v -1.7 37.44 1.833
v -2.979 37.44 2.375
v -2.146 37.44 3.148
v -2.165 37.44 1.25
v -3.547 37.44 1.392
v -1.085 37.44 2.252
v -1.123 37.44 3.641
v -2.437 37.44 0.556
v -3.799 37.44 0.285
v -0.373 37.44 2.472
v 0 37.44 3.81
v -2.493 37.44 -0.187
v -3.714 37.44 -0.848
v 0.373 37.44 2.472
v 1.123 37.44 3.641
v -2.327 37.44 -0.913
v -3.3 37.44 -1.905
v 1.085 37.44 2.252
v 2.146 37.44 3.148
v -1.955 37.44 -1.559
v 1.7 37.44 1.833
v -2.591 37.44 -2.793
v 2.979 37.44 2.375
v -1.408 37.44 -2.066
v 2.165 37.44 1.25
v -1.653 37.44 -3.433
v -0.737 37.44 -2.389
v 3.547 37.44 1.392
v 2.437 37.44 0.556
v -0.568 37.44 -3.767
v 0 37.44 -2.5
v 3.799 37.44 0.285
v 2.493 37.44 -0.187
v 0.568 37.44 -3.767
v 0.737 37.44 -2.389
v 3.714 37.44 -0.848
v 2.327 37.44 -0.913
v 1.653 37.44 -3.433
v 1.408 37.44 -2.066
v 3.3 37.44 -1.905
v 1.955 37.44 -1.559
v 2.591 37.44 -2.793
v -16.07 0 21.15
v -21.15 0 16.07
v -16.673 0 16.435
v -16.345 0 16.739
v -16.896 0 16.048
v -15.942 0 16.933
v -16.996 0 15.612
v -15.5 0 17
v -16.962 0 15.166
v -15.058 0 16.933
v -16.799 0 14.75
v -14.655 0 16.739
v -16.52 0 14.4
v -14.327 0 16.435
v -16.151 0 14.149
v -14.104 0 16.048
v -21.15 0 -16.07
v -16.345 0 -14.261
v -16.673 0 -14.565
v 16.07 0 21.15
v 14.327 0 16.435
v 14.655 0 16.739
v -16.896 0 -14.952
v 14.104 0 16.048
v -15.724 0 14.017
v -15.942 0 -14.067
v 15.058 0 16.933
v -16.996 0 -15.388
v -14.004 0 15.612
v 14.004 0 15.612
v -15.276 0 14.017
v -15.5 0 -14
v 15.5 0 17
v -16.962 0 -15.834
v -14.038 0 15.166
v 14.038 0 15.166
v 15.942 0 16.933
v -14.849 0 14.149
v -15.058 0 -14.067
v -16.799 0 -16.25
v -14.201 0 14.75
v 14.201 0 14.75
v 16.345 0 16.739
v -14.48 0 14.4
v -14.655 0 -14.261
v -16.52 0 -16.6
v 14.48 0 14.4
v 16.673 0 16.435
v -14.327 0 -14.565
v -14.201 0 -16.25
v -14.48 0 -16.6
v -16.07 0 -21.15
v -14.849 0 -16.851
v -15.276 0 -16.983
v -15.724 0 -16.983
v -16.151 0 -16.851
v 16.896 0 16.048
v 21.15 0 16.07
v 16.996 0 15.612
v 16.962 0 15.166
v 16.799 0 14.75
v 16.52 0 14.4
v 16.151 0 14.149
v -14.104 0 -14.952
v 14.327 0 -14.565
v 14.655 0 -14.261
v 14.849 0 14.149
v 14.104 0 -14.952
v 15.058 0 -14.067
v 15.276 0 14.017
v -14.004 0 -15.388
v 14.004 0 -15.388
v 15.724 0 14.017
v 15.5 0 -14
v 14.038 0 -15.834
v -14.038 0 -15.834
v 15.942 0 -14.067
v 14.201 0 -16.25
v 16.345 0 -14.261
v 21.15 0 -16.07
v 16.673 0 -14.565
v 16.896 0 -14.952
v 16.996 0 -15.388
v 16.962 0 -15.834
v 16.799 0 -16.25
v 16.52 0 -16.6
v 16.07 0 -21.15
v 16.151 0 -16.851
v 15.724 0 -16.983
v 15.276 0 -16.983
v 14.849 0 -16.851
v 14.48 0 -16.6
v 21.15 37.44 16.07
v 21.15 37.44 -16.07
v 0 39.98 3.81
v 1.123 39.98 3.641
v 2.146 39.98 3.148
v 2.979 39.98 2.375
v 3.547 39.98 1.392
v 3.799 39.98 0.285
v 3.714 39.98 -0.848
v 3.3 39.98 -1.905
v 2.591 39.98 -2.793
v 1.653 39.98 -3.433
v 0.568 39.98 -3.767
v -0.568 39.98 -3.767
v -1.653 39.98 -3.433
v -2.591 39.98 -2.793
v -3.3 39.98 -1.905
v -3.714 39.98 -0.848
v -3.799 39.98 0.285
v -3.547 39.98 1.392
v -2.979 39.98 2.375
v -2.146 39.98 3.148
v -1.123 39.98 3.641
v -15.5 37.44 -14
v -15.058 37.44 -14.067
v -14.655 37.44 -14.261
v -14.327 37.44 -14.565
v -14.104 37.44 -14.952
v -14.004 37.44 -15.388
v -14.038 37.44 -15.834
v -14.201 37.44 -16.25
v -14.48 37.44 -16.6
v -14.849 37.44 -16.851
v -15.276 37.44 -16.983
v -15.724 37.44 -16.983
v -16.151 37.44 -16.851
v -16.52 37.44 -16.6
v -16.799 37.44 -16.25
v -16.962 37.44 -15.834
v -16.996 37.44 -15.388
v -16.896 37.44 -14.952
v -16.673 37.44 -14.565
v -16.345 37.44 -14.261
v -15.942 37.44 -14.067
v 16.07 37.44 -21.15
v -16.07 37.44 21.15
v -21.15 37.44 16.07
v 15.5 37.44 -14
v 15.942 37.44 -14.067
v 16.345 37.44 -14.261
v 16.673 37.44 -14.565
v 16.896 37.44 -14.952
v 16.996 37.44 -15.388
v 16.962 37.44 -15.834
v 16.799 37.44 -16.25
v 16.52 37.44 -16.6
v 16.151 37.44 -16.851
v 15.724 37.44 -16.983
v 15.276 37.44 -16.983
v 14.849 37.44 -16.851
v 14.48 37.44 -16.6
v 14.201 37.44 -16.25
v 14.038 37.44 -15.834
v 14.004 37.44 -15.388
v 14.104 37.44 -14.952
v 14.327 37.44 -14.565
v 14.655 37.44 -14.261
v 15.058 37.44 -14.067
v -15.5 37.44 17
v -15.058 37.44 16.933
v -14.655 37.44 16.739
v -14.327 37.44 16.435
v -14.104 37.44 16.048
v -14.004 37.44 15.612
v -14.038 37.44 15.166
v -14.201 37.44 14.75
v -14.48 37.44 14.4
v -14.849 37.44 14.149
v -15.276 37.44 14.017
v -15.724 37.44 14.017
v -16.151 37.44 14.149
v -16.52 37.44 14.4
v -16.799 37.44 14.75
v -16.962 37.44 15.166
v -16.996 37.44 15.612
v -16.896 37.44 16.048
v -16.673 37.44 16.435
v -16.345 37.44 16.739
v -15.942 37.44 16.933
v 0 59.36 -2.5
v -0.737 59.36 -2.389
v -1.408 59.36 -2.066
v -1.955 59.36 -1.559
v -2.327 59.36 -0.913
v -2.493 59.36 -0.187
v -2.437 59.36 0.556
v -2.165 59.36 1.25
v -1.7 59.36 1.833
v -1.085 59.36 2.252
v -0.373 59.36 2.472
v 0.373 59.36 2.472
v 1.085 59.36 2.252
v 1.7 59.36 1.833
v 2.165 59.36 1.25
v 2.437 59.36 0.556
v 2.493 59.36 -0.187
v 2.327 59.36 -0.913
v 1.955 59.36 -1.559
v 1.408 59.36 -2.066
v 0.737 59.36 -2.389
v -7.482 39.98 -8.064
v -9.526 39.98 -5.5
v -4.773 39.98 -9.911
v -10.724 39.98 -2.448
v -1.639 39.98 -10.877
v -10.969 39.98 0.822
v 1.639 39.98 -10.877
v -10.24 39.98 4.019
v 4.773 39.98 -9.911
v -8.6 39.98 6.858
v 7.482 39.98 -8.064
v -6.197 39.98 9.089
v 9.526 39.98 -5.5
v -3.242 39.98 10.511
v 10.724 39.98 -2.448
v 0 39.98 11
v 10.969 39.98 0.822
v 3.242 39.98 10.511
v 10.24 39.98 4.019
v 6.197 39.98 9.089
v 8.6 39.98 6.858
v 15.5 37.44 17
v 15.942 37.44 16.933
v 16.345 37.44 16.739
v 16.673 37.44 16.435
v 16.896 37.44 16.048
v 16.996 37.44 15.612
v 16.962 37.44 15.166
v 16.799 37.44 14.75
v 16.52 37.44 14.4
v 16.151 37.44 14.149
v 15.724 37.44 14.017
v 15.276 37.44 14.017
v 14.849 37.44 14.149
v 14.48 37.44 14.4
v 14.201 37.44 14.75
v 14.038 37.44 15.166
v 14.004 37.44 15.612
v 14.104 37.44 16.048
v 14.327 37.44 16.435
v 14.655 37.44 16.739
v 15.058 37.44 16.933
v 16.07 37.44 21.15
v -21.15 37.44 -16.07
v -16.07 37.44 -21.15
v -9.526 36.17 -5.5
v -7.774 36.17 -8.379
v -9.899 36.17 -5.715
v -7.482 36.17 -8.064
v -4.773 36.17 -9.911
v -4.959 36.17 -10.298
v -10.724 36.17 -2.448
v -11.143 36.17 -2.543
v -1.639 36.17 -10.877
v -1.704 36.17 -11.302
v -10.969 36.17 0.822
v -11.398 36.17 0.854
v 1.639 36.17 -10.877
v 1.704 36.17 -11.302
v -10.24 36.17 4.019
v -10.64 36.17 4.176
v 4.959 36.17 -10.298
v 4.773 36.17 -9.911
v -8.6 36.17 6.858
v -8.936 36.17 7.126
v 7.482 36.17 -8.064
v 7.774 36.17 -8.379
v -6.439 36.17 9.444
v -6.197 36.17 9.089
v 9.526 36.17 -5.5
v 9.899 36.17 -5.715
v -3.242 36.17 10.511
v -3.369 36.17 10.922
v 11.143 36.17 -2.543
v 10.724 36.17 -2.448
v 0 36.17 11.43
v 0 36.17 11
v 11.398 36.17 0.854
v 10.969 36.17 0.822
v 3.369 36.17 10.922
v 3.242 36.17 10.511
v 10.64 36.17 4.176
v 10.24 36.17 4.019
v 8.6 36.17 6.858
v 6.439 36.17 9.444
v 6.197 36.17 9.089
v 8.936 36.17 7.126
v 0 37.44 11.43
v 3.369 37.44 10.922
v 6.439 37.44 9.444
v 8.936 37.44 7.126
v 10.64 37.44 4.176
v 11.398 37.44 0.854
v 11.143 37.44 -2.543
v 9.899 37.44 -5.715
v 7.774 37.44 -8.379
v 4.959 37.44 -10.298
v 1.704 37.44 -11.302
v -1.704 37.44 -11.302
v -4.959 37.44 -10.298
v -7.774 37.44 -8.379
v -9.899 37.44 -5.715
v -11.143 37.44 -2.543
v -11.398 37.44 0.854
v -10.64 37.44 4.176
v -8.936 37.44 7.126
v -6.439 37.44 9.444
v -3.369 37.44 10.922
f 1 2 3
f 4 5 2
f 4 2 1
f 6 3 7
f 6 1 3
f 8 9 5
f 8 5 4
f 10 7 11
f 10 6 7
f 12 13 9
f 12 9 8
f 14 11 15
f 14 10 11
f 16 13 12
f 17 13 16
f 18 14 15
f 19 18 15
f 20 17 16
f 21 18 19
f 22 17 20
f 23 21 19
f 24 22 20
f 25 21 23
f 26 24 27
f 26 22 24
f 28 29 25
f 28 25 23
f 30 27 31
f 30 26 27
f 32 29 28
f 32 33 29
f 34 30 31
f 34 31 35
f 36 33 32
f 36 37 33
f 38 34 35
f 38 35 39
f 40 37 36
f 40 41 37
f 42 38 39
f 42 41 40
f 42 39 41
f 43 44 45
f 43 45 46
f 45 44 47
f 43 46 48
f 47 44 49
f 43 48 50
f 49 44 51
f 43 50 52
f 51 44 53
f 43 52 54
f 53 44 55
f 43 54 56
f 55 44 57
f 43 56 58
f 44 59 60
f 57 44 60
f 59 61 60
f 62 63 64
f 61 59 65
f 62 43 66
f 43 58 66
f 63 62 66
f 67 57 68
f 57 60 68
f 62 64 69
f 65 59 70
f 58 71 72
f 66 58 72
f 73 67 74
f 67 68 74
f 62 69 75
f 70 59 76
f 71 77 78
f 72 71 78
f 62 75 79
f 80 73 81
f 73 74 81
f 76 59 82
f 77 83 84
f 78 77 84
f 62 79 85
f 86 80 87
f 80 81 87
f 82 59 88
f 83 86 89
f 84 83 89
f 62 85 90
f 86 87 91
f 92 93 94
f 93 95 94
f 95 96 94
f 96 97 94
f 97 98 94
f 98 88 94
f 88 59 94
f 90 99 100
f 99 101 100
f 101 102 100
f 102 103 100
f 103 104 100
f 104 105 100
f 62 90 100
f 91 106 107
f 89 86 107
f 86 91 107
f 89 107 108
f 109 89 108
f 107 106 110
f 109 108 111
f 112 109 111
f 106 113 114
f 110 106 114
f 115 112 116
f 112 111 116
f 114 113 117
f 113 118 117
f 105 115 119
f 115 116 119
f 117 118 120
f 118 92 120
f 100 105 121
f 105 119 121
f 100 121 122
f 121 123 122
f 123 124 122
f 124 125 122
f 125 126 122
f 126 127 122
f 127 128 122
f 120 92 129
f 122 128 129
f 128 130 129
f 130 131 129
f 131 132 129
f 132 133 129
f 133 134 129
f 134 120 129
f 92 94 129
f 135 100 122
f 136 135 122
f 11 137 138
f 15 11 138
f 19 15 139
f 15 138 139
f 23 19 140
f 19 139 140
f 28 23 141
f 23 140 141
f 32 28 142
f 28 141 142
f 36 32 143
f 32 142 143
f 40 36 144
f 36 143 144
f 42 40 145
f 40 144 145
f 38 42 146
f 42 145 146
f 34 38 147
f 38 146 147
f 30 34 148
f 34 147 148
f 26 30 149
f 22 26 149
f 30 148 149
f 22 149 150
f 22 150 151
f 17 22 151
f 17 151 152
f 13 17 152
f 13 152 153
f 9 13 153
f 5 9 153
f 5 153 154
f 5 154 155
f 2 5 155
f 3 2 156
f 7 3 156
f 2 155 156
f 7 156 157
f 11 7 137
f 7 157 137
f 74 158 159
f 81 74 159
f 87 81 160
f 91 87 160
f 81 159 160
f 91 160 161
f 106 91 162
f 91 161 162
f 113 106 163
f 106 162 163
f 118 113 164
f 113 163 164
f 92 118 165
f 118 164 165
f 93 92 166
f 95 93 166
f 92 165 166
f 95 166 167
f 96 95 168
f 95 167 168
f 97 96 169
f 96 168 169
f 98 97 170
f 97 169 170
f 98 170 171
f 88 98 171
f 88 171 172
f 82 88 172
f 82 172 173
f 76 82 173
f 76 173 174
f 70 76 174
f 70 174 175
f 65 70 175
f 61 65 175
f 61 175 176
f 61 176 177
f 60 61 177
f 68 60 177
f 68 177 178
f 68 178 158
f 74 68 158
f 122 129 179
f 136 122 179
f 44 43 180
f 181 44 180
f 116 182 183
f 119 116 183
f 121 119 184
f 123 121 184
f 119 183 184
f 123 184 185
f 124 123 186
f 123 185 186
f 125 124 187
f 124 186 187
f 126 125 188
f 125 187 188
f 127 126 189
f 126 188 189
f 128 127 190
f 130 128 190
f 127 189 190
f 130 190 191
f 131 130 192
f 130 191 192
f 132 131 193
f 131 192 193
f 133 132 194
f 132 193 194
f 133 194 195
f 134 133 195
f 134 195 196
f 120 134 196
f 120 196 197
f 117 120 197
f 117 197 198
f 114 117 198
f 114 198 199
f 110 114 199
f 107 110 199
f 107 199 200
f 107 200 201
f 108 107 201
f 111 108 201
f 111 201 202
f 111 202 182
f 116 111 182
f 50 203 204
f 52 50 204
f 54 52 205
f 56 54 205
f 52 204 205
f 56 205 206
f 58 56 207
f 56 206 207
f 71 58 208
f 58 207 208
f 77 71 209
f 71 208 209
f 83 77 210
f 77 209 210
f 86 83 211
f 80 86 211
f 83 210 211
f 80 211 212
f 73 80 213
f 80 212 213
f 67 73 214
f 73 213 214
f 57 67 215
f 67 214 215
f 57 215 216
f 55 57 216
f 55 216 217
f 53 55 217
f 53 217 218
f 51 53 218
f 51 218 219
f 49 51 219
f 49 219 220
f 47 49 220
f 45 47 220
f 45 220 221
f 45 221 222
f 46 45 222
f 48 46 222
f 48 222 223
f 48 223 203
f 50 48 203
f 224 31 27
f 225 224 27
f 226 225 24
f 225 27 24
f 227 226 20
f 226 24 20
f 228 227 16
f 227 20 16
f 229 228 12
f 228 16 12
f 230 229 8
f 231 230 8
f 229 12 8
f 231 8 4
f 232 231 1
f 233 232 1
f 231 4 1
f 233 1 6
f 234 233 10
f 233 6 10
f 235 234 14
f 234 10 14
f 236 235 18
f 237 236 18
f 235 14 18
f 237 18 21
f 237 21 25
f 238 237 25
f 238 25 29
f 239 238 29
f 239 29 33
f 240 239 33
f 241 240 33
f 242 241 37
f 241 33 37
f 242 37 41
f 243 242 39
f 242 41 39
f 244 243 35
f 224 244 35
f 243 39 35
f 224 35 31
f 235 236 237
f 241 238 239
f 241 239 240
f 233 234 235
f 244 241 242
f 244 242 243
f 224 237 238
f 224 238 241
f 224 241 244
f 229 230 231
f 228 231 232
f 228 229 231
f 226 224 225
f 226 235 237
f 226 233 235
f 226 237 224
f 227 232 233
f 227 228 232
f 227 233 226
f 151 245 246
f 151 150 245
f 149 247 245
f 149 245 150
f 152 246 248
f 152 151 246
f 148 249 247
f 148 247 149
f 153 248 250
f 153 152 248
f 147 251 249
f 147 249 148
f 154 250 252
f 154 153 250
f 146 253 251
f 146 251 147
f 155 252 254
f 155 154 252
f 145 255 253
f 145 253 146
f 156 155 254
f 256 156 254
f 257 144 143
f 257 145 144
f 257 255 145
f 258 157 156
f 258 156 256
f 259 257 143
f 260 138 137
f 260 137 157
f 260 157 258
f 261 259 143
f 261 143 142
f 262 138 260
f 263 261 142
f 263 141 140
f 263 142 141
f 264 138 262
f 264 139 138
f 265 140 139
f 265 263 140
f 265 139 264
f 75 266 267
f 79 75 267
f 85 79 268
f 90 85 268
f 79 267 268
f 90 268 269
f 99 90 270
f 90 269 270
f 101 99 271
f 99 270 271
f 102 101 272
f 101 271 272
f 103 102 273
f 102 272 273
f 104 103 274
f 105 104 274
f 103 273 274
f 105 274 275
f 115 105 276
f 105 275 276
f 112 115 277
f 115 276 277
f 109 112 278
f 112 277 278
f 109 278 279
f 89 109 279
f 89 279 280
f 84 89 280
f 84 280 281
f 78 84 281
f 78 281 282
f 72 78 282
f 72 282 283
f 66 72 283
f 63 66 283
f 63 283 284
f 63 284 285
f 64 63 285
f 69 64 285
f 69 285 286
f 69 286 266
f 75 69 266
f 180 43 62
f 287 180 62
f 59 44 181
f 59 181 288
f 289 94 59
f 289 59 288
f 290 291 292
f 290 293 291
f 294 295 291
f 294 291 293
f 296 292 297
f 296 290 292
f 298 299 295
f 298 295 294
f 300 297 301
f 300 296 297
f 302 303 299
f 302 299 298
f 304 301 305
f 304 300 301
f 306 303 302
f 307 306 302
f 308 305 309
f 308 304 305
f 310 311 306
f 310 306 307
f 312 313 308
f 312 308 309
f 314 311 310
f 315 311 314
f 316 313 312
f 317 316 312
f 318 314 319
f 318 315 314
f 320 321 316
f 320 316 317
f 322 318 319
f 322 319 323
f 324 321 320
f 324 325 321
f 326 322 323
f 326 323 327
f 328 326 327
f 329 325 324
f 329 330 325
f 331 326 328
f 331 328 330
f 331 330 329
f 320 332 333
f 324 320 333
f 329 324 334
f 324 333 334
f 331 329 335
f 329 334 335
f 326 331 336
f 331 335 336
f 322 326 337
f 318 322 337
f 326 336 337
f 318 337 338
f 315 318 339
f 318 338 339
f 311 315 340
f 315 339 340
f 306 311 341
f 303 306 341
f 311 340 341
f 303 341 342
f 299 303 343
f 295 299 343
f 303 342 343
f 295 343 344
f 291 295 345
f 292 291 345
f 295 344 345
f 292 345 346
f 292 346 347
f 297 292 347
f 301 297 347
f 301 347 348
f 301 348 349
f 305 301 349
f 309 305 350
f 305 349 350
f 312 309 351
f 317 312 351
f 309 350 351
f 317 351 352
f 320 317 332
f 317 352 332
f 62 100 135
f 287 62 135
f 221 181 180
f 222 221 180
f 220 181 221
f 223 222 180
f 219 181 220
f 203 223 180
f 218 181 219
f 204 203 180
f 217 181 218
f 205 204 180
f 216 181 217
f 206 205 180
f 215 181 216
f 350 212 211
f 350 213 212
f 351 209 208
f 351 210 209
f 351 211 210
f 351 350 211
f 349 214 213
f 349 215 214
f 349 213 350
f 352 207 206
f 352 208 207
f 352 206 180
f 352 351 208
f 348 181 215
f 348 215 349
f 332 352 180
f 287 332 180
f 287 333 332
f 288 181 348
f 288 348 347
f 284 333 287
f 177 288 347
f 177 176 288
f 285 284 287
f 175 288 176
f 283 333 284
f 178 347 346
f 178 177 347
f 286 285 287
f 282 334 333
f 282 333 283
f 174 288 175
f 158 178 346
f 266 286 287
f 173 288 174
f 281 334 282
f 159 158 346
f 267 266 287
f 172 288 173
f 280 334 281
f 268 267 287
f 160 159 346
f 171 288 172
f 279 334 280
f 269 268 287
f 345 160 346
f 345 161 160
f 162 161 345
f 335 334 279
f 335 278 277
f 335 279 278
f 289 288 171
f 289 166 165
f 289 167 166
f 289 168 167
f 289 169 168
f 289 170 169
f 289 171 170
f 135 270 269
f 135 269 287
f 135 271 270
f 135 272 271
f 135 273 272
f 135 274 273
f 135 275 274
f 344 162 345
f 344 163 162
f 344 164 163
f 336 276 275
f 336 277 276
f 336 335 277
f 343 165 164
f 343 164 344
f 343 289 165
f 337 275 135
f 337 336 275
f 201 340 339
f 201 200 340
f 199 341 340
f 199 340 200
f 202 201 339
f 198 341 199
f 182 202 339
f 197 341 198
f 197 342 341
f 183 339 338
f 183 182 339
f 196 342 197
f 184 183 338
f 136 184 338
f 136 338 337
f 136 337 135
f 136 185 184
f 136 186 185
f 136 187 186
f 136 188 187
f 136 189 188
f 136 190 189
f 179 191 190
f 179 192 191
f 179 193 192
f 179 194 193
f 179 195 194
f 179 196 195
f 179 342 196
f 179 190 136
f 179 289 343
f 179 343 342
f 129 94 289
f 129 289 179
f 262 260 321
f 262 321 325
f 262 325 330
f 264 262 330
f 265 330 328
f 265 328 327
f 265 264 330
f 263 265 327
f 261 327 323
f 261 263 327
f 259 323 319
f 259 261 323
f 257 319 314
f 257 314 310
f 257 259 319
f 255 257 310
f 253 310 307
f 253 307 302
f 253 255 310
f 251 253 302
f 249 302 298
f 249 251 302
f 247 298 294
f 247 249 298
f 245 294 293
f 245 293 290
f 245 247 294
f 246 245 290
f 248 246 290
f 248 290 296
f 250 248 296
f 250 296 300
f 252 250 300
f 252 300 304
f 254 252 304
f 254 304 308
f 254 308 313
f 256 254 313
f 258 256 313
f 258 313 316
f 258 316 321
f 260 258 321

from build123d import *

# Parameters (mm, degrees)
SKETCH1_W           = 42.3
SKETCH1_H           = 42.3
BOSS_EXTRUDE1_DEPTH = 37.4396
CHAMFER1_SIZE       = 5.08
SKETCH2_R           = 11.43
SKETCH2_R_2         = 11
CUT_EXTRUDE1_DEPTH  = 1.27
BOSS_EXTRUDE2_START = 2.54
SKETCH3_R           = 11
SKETCH3_R_2         = 3.81
BOSS_EXTRUDE2_DEPTH = 2.54
SKETCH4_R           = 2.5
BOSS_EXTRUDE3_DEPTH = 21.9202
CUT_EXTRUDE2_REACH  = 49.92
SKETCH5_R           = 1.5


with BuildPart() as part:
    # Sketch1 → Boss-Extrude1 (new body)
    with BuildSketch(Plane(origin=(0, 0, 0), x_dir=(1, 0, 0), z_dir=(0, 1, 0))):
        Rectangle(SKETCH1_W, SKETCH1_H)
    extrude(amount=BOSS_EXTRUDE1_DEPTH)

    # Chamfer1
    chamfer1_edges = [part.edges().sort_by_distance(p)[0] for p in [
        (21.15, 18.7198, 21.15),
        (-21.15, 18.7198, 21.15),
        (-21.15, 18.7198, -21.15),
        (21.15, 18.7198, -21.15),
    ]]
    chamfer(chamfer1_edges, length=CHAMFER1_SIZE)

    # Sketch2 → Cut-Extrude1 (cut)
    with BuildSketch(Plane(origin=(0, 37.4396, 0), x_dir=(1, 0, 0), z_dir=(0, 1, 0))):
        with Locations(Location((0, 0, 0), (0, 0, 270))):
            Circle(SKETCH2_R)
        with Locations(Location((0, 0, 0), (0, 0, 270))):
            Circle(SKETCH2_R_2, mode=Mode.SUBTRACT)
    extrude(amount=-CUT_EXTRUDE1_DEPTH, mode=Mode.SUBTRACT)

    # Sketch3 → Boss-Extrude2 (add)
    with BuildSketch(Plane(origin=(0, 37.4396, 0), x_dir=(1, 0, 0), z_dir=(0, 1, 0)).offset(BOSS_EXTRUDE2_START)):
        with Locations(Location((0, 0, 0), (0, 0, 270))):
            Circle(SKETCH3_R)
        with Locations(Location((0, 0, 0), (0, 0, 270))):
            Circle(SKETCH3_R_2, mode=Mode.SUBTRACT)
    extrude(amount=-BOSS_EXTRUDE2_DEPTH)

    # Sketch4 → Boss-Extrude3 (add)
    with BuildSketch(Plane(origin=(0, 37.4396, 0), x_dir=(1, 0, 0), z_dir=(0, 1, 0))):
        with Locations(Location((0, 0, 0), (0, 0, 90))):
            Circle(SKETCH4_R)
    extrude(amount=BOSS_EXTRUDE3_DEPTH)

    # Sketch5 → Cut-Extrude2 (cut, up to next)
    with BuildSketch(Plane(origin=(0, 37.4396, 0), x_dir=(1, 0, 0), z_dir=(0, 1, 0)), mode=Mode.PRIVATE) as cut_extrude2_sk1:
        with Locations(Location((15.5, 15.5, 0), (0, 0, 270))):
            Circle(SKETCH5_R)
    cut_extrude2_tool1 = extrude(cut_extrude2_sk1.sketch, amount=-CUT_EXTRUDE2_REACH, mode=Mode.PRIVATE) & part.part
    # Sketch5 → Cut-Extrude2 (cut, up to next)
    with BuildSketch(Plane(origin=(0, 37.4396, 0), x_dir=(1, 0, 0), z_dir=(0, 1, 0)), mode=Mode.PRIVATE) as cut_extrude2_sk2:
        with Locations(Location((15.5, -15.5, 0), (0, 0, 270))):
            Circle(SKETCH5_R)
    cut_extrude2_tool2 = extrude(cut_extrude2_sk2.sketch, amount=-CUT_EXTRUDE2_REACH, mode=Mode.PRIVATE) & part.part
    # Sketch5 → Cut-Extrude2 (cut, up to next)
    with BuildSketch(Plane(origin=(0, 37.4396, 0), x_dir=(1, 0, 0), z_dir=(0, 1, 0)), mode=Mode.PRIVATE) as cut_extrude2_sk3:
        with Locations(Location((-15.5, -15.5, 0), (0, 0, 270))):
            Circle(SKETCH5_R)
    cut_extrude2_tool3 = extrude(cut_extrude2_sk3.sketch, amount=-CUT_EXTRUDE2_REACH, mode=Mode.PRIVATE) & part.part
    # Sketch5 → Cut-Extrude2 (cut, up to next)
    with BuildSketch(Plane(origin=(0, 37.4396, 0), x_dir=(1, 0, 0), z_dir=(0, 1, 0)), mode=Mode.PRIVATE) as cut_extrude2_sk4:
        with Locations(Location((-15.5, 15.5, 0), (0, 0, 270))):
            Circle(SKETCH5_R)
    cut_extrude2_tool4 = extrude(cut_extrude2_sk4.sketch, amount=-CUT_EXTRUDE2_REACH, mode=Mode.PRIVATE) & part.part
    add(cut_extrude2_tool1.solids().sort_by_distance((15.5, 37.4396, -15.5))[0], mode=Mode.SUBTRACT)
    add(cut_extrude2_tool2.solids().sort_by_distance((15.5, 37.4396, 15.5))[0], mode=Mode.SUBTRACT)
    add(cut_extrude2_tool3.solids().sort_by_distance((-15.5, 37.4396, 15.5))[0], mode=Mode.SUBTRACT)
    add(cut_extrude2_tool4.solids().sort_by_distance((-15.5, 37.4396, -15.5))[0], mode=Mode.SUBTRACT)


solid = part.part
